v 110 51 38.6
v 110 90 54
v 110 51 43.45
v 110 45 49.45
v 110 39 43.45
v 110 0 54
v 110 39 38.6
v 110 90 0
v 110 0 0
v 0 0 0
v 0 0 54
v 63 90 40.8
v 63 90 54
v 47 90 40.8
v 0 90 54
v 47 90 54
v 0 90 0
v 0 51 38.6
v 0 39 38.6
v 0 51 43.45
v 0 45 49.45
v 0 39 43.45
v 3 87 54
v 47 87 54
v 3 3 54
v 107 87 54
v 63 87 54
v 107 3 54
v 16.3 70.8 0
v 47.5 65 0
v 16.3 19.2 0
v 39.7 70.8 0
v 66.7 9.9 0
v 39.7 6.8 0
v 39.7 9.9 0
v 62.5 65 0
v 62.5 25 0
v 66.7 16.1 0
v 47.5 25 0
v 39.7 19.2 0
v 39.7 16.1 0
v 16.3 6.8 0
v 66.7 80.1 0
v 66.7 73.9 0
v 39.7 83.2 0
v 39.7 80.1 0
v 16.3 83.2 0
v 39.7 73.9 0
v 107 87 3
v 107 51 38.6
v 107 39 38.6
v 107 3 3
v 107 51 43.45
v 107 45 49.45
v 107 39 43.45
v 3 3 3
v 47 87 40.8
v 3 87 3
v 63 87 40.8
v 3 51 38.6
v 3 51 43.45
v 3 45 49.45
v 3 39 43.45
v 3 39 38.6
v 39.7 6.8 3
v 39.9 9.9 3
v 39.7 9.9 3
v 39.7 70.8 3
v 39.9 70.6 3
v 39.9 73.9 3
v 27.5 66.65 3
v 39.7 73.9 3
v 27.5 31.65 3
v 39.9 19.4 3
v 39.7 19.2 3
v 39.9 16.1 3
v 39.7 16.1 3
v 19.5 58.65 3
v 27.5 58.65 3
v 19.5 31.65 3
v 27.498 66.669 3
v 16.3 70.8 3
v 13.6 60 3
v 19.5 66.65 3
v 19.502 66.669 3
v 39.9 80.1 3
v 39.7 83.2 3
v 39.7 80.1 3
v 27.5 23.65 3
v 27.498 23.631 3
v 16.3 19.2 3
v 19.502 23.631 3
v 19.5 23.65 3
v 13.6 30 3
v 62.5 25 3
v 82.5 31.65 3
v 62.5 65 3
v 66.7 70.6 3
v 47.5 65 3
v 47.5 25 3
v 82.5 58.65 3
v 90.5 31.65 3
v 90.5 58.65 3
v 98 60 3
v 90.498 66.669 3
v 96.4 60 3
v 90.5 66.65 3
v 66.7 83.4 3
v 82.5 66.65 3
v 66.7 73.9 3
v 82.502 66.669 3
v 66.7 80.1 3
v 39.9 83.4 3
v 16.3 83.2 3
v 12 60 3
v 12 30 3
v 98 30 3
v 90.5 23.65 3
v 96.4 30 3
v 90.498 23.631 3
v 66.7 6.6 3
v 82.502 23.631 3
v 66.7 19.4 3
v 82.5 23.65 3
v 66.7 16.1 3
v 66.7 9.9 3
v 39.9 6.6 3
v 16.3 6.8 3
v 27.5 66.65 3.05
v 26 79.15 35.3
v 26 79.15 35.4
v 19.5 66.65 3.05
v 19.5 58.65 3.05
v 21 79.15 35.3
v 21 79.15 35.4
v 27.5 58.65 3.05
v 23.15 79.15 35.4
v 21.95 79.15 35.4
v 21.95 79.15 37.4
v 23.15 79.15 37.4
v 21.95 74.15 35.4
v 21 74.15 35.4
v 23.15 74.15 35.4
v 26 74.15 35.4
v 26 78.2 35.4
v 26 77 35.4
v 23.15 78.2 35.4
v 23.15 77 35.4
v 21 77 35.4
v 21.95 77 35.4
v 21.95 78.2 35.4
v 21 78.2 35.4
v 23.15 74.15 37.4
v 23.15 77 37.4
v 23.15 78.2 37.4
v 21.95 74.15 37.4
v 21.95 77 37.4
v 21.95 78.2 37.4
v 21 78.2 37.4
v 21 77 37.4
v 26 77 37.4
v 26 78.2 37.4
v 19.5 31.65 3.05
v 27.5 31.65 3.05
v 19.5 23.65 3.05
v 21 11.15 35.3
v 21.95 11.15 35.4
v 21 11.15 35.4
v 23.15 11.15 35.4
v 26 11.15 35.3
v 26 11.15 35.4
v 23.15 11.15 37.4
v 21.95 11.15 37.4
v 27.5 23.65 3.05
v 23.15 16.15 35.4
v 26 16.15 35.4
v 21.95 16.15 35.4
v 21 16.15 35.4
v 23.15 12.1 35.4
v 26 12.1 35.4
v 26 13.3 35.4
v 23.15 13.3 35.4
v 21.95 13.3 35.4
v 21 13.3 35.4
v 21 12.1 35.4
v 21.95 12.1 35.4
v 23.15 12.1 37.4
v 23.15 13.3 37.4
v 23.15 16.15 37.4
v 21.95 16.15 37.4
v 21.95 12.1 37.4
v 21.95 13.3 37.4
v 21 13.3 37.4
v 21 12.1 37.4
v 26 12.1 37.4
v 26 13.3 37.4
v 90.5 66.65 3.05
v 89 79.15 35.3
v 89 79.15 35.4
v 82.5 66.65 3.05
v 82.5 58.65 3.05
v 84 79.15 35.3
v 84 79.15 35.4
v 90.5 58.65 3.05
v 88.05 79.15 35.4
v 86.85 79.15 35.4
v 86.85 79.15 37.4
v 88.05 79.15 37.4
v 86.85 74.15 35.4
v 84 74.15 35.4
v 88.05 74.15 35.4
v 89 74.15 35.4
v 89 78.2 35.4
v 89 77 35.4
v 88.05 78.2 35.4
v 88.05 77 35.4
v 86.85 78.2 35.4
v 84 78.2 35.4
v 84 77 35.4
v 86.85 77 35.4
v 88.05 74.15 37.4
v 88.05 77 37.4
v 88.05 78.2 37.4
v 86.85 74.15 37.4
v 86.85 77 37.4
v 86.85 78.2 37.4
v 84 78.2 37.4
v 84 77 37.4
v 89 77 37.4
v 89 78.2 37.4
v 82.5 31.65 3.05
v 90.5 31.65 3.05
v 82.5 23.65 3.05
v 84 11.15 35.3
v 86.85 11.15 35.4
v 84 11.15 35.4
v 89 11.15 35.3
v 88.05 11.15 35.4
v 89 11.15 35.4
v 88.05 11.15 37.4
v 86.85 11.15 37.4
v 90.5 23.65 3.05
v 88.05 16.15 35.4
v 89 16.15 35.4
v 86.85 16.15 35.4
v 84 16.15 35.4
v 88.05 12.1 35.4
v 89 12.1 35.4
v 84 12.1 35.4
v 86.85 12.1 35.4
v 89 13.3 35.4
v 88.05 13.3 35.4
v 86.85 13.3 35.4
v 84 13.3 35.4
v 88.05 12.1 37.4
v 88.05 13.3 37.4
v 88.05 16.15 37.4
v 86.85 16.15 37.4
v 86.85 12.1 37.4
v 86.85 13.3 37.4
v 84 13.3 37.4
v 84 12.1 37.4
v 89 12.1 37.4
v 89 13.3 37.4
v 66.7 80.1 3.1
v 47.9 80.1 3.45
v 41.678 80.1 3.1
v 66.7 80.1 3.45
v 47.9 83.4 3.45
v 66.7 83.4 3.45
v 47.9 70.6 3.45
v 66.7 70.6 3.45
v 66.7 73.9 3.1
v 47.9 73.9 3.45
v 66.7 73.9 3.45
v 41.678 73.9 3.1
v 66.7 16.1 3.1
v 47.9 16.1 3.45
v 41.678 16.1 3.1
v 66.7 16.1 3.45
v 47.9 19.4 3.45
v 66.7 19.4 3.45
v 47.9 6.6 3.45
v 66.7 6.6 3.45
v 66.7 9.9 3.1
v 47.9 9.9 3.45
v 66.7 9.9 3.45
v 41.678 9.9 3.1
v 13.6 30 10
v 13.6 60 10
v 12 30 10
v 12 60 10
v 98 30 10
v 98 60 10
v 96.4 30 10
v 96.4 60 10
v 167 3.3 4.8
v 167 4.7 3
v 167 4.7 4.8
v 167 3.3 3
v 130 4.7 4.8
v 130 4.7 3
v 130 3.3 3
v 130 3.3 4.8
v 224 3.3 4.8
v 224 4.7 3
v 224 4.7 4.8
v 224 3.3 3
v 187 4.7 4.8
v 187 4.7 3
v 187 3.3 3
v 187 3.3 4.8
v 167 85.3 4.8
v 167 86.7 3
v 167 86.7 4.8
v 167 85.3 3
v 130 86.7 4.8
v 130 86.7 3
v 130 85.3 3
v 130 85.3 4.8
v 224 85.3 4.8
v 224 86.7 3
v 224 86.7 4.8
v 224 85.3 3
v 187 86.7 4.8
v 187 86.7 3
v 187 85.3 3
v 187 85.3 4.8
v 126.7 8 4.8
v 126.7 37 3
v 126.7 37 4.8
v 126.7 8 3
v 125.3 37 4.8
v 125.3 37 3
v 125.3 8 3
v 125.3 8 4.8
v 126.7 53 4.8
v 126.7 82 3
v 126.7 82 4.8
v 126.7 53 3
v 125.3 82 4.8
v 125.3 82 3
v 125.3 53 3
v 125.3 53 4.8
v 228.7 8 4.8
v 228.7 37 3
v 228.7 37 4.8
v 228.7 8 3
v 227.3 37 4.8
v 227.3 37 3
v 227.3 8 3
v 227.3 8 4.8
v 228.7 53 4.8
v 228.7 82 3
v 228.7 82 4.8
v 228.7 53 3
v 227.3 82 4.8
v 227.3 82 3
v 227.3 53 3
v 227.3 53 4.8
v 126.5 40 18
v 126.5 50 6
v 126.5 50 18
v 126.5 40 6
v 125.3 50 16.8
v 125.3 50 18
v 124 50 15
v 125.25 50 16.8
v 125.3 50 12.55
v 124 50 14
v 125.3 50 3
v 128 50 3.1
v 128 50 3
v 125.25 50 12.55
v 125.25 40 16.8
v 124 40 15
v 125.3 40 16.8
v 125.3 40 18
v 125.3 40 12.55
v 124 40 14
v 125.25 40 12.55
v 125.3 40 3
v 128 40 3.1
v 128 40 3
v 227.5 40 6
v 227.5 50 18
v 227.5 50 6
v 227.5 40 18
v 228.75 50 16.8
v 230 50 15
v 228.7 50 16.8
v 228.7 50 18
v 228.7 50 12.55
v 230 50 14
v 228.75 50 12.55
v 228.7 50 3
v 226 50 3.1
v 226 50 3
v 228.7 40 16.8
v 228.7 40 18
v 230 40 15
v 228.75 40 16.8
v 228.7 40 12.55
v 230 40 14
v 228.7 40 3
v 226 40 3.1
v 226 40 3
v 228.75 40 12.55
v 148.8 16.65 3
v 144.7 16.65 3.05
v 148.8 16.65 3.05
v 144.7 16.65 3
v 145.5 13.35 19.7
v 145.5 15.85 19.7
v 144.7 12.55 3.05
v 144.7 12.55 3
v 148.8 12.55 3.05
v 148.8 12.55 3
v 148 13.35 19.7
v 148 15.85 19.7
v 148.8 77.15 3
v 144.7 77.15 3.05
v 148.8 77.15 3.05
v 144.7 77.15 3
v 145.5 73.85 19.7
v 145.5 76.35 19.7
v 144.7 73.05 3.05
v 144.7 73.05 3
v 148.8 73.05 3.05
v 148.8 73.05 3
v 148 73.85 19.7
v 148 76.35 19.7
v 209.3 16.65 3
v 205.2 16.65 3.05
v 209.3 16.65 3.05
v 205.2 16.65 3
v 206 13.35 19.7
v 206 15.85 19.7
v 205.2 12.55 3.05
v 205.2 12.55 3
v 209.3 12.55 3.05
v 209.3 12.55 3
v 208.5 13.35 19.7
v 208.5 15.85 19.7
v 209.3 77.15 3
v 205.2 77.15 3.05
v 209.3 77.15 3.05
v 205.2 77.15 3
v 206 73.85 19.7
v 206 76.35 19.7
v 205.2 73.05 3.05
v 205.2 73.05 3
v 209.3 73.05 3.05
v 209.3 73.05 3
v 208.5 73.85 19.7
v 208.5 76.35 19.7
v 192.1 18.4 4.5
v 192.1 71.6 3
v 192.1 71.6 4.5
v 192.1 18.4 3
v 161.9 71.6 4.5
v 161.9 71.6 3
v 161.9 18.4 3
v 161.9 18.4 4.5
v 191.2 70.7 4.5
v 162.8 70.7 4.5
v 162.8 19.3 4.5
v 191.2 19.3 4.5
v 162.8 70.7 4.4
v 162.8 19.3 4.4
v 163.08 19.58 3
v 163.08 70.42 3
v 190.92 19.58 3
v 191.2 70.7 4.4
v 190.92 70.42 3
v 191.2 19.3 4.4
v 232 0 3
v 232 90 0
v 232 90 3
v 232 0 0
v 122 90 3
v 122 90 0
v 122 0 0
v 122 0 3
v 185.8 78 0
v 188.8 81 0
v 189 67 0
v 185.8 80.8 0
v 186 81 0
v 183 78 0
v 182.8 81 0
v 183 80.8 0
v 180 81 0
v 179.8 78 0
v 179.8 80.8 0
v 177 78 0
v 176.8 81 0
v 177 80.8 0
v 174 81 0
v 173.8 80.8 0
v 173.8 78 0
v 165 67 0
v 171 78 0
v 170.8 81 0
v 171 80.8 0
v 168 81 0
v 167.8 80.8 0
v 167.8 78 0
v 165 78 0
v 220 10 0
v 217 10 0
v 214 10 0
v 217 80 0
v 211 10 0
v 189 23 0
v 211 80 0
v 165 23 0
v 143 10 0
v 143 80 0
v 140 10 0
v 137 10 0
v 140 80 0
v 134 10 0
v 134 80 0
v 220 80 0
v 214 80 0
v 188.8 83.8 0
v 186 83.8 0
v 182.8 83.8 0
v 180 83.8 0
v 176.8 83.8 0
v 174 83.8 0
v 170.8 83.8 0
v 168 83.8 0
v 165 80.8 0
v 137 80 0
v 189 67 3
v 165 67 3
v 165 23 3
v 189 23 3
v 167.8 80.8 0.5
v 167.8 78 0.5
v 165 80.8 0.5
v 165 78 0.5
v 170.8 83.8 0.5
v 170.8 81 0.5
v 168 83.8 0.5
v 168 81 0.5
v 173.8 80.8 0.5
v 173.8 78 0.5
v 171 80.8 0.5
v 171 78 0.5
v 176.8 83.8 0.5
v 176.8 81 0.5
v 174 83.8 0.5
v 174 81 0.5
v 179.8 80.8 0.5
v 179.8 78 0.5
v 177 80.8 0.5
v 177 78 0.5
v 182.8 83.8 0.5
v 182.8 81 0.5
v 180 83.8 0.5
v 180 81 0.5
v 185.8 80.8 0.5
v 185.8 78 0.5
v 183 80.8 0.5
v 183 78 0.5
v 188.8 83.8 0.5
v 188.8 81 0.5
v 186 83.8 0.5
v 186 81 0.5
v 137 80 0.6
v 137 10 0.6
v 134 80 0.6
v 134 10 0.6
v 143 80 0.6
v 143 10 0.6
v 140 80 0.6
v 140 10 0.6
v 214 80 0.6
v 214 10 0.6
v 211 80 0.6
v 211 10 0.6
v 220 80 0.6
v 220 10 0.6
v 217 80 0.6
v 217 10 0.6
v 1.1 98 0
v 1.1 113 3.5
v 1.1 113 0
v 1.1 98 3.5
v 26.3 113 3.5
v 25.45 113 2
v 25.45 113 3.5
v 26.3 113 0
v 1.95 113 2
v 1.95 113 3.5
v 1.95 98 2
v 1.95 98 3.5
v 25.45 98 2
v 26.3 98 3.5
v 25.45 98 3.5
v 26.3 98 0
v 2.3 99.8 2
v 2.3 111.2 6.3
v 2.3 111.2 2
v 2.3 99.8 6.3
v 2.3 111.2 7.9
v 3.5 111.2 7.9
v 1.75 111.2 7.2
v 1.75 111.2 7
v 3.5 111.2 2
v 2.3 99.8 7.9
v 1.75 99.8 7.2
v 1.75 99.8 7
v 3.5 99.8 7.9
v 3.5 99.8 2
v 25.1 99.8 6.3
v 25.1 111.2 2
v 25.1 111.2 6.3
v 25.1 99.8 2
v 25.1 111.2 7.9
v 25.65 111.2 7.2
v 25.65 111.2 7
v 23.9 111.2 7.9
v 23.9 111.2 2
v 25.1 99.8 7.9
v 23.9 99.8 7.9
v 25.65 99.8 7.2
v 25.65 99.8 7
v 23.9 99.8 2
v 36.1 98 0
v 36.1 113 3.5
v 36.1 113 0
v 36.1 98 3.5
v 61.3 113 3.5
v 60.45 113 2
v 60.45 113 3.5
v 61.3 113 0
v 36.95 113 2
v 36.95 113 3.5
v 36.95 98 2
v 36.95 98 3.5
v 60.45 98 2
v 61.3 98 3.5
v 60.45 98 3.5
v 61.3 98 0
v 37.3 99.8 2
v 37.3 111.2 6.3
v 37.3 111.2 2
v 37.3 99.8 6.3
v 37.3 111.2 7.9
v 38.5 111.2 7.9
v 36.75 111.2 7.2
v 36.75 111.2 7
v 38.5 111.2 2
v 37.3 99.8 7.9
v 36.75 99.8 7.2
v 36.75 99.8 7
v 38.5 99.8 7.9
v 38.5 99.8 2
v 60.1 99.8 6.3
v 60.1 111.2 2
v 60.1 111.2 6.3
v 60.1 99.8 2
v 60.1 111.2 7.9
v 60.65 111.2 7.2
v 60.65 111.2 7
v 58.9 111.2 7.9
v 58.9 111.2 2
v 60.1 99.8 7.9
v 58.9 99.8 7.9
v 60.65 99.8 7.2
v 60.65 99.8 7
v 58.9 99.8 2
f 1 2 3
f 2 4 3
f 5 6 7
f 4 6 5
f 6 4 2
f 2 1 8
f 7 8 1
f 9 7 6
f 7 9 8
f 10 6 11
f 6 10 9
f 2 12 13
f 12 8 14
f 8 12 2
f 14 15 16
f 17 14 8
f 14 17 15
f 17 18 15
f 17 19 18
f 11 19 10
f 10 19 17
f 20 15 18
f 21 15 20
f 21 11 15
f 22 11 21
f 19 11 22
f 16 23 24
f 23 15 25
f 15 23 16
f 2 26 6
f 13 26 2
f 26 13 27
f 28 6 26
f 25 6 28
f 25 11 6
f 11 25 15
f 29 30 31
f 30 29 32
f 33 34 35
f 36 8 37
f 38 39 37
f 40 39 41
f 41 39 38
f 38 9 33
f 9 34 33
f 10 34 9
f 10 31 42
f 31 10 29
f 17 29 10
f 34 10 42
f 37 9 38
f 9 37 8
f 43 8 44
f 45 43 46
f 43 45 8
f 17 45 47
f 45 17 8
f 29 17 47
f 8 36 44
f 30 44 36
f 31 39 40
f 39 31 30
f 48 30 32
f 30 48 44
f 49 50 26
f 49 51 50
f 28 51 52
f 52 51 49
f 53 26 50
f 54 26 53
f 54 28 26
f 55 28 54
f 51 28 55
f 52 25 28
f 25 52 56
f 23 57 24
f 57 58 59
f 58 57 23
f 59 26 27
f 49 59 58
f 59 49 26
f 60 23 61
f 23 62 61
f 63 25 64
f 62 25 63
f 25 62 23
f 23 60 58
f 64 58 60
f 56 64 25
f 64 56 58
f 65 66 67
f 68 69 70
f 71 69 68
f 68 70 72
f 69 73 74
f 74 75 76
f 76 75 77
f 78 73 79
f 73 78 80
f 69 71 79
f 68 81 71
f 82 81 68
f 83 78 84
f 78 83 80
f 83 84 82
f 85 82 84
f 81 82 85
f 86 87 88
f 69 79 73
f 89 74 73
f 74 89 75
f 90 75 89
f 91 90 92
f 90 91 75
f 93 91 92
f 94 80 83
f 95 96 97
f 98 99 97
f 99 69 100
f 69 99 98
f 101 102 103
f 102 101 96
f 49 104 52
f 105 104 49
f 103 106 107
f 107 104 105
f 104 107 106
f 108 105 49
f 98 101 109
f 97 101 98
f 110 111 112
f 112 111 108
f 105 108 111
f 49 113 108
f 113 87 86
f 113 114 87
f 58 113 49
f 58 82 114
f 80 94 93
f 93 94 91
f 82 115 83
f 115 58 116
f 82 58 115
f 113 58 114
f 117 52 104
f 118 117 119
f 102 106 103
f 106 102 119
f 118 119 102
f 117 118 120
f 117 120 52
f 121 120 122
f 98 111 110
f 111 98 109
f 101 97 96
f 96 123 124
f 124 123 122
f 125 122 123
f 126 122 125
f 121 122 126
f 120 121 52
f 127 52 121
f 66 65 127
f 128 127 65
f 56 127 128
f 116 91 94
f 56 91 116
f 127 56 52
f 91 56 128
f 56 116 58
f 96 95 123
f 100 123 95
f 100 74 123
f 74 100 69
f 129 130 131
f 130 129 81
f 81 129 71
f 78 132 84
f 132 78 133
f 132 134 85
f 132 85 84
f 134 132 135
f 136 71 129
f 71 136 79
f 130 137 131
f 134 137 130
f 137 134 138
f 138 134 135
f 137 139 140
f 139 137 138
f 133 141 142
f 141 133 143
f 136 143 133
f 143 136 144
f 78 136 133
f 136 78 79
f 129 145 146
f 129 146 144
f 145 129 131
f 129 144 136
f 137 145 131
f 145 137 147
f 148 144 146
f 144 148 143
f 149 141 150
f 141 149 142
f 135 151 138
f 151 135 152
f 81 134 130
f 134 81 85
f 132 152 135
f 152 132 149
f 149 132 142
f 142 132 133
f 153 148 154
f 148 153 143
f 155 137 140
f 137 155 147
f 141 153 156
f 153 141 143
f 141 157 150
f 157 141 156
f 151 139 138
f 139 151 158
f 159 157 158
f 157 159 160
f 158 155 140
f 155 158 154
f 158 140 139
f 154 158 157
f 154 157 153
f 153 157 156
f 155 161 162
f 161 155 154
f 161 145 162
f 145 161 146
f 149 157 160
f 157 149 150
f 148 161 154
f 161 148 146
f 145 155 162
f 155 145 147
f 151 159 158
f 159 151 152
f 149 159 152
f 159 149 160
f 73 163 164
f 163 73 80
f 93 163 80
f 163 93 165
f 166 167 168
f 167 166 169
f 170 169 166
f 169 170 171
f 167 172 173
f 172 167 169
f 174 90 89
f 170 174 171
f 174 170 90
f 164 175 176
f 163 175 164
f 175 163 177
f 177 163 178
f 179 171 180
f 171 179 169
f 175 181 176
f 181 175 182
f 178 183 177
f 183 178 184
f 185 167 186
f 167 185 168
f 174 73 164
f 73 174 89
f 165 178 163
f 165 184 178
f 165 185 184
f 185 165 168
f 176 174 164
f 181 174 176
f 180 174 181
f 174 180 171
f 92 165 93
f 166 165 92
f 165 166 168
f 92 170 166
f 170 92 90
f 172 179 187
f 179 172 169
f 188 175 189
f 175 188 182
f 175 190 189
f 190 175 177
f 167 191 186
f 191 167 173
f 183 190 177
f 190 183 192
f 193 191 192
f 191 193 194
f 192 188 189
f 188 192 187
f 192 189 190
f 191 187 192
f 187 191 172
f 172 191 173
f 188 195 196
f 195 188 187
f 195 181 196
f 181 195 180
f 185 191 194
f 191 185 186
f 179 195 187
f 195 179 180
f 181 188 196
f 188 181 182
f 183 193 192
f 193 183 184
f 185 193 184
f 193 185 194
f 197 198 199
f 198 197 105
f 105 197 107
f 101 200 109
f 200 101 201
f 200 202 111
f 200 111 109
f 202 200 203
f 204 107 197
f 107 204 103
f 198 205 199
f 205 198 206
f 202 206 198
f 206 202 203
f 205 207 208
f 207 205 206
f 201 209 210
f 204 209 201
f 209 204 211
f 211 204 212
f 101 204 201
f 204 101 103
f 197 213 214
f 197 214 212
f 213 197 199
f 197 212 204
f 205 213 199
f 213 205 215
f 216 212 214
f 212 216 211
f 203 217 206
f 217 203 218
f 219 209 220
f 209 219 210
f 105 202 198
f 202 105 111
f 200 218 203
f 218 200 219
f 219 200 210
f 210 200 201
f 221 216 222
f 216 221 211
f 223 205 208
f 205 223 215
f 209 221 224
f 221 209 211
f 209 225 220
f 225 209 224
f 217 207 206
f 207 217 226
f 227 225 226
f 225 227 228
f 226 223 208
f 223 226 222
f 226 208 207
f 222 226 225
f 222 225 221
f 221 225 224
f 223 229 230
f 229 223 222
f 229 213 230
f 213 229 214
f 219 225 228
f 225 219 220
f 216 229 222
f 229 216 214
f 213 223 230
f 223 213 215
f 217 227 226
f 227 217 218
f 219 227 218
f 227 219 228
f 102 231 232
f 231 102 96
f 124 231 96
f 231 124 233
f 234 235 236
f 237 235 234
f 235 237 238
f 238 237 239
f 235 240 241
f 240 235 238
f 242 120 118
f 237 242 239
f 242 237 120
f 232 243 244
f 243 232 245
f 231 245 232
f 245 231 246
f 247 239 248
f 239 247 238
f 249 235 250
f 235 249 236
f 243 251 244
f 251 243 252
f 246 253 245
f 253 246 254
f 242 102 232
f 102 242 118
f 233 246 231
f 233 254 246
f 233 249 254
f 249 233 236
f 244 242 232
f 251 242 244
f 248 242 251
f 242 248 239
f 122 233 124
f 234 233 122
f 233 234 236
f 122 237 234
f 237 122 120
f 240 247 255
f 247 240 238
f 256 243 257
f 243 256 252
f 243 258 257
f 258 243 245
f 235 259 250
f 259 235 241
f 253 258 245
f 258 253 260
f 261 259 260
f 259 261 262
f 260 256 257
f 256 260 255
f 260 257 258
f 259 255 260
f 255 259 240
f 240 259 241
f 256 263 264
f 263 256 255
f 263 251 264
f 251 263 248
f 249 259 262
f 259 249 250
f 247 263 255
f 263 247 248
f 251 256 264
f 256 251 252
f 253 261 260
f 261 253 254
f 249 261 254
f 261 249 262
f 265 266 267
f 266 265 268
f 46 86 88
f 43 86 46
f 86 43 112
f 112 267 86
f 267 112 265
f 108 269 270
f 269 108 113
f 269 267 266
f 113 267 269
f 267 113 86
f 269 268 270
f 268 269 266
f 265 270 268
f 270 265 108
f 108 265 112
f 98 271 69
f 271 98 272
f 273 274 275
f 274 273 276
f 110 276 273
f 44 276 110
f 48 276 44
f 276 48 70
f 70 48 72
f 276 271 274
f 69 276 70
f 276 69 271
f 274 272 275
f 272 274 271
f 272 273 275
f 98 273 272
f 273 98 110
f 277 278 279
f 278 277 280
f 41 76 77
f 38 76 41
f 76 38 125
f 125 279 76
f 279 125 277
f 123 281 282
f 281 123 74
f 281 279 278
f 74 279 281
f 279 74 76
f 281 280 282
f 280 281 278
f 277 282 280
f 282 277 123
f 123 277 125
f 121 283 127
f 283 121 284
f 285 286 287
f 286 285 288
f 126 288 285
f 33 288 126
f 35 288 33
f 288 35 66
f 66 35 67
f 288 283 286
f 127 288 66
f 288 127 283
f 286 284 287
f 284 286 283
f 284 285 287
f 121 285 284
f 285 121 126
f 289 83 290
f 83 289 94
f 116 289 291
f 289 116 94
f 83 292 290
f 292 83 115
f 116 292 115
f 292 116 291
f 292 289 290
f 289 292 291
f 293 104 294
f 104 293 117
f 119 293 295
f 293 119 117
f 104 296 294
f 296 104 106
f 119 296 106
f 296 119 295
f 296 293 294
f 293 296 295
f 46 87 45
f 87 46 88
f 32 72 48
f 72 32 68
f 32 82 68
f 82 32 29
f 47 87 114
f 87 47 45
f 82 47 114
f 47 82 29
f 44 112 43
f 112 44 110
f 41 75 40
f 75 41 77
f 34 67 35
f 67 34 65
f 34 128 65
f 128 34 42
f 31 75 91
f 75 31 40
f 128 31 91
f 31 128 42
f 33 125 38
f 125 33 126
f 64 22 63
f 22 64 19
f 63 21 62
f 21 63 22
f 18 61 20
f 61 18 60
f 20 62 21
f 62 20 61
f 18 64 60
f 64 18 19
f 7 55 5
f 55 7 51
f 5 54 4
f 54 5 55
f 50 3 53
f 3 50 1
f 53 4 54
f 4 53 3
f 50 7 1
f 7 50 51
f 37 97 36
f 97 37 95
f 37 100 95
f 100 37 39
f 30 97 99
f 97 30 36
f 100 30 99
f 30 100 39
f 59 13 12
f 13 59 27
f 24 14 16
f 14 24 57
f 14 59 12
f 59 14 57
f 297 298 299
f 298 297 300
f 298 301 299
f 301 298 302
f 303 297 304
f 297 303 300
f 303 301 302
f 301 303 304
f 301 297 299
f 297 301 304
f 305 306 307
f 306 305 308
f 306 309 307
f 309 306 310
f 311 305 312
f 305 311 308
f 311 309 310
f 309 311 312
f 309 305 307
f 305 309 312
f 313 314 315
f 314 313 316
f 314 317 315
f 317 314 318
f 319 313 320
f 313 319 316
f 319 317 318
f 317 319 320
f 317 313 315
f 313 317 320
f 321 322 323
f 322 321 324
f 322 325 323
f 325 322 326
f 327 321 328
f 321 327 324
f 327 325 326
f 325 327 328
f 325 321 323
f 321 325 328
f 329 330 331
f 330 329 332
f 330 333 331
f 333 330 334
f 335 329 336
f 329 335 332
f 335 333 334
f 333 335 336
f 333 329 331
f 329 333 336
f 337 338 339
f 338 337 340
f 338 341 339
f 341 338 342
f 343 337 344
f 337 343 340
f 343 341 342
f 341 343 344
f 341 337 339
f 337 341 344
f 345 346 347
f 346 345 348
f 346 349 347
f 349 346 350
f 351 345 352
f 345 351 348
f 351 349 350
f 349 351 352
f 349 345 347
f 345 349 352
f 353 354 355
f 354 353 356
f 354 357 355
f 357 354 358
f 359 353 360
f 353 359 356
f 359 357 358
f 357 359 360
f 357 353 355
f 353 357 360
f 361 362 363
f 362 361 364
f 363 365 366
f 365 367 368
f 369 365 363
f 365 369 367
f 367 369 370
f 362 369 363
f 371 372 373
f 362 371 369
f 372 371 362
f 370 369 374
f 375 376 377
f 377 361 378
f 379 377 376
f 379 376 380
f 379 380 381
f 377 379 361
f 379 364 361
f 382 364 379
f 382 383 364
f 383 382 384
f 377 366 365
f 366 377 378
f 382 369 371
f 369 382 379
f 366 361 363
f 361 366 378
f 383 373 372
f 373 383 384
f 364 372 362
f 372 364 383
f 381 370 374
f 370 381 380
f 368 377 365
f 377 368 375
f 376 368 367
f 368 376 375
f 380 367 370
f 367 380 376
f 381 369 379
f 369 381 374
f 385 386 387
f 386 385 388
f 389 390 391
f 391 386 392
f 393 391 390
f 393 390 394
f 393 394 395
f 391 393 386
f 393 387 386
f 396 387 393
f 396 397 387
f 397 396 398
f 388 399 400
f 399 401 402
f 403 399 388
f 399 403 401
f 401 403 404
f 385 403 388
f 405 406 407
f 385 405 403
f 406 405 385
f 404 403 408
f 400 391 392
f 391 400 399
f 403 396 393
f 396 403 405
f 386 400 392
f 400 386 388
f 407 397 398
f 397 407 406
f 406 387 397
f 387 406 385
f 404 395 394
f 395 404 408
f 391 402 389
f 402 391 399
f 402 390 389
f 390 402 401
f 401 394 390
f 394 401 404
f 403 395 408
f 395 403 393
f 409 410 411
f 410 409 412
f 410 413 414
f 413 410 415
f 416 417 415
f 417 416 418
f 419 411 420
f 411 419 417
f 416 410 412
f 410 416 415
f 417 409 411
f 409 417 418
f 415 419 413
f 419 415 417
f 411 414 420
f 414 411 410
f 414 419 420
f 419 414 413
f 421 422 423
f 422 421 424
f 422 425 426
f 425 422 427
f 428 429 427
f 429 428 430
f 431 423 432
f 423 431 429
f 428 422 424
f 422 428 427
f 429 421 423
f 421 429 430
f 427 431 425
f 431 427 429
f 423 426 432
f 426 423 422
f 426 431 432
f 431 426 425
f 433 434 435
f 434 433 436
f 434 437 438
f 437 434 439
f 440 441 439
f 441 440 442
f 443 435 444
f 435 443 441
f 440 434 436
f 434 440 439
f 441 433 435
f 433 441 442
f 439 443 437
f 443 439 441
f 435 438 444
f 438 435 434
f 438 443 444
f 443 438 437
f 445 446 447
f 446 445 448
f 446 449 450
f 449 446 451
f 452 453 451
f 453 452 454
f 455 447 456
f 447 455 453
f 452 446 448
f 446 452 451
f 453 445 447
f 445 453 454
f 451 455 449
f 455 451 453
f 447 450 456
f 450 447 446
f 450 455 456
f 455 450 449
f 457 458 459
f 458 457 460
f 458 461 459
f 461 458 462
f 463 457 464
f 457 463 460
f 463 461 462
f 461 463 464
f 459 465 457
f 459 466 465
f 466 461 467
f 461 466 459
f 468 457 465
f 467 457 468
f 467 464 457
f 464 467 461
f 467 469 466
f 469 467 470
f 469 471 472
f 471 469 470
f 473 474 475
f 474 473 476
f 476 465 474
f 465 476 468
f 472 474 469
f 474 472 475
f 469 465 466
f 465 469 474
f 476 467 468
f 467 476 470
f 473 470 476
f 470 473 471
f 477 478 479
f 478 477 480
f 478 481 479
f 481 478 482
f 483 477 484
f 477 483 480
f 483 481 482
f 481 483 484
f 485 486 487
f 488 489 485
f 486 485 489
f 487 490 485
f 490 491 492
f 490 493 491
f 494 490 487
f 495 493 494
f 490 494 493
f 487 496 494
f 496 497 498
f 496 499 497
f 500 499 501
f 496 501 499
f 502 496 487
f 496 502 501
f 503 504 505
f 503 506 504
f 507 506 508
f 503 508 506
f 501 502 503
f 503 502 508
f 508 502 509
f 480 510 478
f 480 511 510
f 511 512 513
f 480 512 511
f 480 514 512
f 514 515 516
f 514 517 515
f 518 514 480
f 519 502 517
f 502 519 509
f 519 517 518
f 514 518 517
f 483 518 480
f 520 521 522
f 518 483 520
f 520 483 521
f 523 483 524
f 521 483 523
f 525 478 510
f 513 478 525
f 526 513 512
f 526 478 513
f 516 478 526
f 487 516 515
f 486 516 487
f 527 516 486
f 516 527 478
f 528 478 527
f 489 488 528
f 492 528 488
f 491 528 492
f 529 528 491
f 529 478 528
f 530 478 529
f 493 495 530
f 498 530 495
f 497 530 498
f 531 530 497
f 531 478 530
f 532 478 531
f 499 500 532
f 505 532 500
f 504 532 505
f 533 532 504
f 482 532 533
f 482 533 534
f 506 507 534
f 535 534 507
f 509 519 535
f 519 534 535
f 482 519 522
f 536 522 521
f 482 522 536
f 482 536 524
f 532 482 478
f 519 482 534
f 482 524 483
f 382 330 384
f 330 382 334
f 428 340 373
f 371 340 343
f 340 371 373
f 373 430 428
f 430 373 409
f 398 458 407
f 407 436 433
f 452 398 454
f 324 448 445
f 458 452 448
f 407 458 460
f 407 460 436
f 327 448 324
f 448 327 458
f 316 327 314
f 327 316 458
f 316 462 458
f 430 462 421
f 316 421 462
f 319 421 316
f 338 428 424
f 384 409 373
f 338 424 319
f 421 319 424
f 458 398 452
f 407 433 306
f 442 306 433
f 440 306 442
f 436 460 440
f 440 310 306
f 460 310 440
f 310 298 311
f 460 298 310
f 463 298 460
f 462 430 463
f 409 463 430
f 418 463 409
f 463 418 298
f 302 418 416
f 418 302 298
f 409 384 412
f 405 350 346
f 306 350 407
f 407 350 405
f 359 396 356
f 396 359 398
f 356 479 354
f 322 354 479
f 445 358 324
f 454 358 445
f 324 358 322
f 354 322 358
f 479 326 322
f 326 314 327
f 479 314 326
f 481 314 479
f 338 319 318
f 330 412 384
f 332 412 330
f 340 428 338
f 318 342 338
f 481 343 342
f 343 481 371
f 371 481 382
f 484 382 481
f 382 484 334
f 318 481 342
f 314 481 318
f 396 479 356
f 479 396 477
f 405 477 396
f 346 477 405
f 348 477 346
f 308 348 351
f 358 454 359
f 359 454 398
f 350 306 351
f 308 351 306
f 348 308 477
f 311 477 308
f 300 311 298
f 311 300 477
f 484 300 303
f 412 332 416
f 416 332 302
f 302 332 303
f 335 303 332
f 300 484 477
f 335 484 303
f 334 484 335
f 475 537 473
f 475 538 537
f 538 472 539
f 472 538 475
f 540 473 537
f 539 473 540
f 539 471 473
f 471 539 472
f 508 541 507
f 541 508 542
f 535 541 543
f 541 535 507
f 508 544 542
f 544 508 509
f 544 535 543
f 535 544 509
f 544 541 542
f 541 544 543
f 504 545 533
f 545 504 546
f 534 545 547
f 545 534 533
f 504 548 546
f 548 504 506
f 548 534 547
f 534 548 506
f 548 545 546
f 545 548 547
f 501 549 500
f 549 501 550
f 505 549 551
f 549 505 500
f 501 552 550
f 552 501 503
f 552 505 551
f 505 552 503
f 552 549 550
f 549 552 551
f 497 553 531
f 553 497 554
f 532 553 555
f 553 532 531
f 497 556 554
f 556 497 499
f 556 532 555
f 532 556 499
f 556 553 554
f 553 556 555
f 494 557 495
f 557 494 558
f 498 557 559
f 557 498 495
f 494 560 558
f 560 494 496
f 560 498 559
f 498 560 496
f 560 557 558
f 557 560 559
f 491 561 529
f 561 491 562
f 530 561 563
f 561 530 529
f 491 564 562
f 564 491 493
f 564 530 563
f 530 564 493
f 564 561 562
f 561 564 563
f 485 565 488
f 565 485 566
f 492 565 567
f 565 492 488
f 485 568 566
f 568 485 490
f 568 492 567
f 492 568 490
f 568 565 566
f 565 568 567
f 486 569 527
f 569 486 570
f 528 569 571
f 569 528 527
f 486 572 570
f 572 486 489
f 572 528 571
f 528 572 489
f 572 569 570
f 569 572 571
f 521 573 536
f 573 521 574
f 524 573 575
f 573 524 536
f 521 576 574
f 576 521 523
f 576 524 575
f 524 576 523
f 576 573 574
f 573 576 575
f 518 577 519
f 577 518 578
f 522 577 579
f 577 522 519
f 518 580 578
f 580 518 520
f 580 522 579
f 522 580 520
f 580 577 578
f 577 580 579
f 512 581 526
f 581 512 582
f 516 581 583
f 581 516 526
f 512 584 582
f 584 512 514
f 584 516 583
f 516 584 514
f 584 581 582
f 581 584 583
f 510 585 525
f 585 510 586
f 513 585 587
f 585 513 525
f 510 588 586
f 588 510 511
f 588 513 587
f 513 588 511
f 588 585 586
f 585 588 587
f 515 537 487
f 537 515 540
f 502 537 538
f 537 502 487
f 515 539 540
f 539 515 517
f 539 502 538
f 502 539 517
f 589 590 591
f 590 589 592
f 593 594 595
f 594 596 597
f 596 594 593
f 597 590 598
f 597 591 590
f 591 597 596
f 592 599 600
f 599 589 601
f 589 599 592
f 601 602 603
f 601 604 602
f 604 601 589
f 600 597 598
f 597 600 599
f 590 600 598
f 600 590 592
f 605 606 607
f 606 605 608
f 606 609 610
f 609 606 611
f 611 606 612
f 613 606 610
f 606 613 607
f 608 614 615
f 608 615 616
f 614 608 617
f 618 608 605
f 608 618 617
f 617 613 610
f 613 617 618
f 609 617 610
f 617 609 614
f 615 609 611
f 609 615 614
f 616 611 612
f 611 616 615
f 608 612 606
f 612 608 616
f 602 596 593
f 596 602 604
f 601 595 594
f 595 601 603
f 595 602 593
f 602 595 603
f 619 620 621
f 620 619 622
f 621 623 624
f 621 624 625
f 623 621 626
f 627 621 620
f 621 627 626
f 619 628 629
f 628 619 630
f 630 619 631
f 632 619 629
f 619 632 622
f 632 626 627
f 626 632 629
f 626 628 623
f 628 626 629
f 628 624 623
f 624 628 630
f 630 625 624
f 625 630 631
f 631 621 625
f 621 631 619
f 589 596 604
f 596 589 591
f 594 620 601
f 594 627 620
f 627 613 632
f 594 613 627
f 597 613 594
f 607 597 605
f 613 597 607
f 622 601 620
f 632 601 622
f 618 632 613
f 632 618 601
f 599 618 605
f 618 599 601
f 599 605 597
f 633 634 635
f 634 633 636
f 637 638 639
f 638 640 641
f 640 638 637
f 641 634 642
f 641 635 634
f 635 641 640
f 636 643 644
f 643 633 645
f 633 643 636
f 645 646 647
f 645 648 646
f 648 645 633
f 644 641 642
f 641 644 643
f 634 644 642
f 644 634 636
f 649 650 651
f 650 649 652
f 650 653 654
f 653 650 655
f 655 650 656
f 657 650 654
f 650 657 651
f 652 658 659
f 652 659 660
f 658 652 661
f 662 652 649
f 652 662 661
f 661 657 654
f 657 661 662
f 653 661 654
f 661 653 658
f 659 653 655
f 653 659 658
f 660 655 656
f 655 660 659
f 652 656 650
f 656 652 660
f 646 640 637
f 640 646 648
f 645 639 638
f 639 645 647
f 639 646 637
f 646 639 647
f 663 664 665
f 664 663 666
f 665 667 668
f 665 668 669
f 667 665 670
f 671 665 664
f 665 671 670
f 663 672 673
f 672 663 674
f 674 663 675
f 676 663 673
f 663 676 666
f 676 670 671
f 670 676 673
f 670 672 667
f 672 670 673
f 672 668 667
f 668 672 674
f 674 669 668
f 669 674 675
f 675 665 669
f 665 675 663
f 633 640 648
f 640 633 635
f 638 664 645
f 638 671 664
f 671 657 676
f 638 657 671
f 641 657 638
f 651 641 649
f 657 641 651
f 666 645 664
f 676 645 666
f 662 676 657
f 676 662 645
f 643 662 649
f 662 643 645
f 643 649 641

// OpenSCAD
// Electronics housing v3 (as v2; docking with less play plus wedge ramps).
// Keep pinewood_v3_shared.scad in the same folder.
include <pinewood_v3_shared.scad>
piece="print_layout"; // base | lid | lock | preview | print_layout
if(piece=="base") base_print();
else if(piece=="lid") lid_print();
else if(piece=="lock") lock_print();
else if(piece=="preview") { housing_base(); housing_lid(); %board_preview(); }
else if(piece=="print_layout") { print_layout(); translate([0,box_height+8,0]) lock_print(); translate([35,box_height+8,0]) lock_print(); }
else assert(false,"Unknown piece");
